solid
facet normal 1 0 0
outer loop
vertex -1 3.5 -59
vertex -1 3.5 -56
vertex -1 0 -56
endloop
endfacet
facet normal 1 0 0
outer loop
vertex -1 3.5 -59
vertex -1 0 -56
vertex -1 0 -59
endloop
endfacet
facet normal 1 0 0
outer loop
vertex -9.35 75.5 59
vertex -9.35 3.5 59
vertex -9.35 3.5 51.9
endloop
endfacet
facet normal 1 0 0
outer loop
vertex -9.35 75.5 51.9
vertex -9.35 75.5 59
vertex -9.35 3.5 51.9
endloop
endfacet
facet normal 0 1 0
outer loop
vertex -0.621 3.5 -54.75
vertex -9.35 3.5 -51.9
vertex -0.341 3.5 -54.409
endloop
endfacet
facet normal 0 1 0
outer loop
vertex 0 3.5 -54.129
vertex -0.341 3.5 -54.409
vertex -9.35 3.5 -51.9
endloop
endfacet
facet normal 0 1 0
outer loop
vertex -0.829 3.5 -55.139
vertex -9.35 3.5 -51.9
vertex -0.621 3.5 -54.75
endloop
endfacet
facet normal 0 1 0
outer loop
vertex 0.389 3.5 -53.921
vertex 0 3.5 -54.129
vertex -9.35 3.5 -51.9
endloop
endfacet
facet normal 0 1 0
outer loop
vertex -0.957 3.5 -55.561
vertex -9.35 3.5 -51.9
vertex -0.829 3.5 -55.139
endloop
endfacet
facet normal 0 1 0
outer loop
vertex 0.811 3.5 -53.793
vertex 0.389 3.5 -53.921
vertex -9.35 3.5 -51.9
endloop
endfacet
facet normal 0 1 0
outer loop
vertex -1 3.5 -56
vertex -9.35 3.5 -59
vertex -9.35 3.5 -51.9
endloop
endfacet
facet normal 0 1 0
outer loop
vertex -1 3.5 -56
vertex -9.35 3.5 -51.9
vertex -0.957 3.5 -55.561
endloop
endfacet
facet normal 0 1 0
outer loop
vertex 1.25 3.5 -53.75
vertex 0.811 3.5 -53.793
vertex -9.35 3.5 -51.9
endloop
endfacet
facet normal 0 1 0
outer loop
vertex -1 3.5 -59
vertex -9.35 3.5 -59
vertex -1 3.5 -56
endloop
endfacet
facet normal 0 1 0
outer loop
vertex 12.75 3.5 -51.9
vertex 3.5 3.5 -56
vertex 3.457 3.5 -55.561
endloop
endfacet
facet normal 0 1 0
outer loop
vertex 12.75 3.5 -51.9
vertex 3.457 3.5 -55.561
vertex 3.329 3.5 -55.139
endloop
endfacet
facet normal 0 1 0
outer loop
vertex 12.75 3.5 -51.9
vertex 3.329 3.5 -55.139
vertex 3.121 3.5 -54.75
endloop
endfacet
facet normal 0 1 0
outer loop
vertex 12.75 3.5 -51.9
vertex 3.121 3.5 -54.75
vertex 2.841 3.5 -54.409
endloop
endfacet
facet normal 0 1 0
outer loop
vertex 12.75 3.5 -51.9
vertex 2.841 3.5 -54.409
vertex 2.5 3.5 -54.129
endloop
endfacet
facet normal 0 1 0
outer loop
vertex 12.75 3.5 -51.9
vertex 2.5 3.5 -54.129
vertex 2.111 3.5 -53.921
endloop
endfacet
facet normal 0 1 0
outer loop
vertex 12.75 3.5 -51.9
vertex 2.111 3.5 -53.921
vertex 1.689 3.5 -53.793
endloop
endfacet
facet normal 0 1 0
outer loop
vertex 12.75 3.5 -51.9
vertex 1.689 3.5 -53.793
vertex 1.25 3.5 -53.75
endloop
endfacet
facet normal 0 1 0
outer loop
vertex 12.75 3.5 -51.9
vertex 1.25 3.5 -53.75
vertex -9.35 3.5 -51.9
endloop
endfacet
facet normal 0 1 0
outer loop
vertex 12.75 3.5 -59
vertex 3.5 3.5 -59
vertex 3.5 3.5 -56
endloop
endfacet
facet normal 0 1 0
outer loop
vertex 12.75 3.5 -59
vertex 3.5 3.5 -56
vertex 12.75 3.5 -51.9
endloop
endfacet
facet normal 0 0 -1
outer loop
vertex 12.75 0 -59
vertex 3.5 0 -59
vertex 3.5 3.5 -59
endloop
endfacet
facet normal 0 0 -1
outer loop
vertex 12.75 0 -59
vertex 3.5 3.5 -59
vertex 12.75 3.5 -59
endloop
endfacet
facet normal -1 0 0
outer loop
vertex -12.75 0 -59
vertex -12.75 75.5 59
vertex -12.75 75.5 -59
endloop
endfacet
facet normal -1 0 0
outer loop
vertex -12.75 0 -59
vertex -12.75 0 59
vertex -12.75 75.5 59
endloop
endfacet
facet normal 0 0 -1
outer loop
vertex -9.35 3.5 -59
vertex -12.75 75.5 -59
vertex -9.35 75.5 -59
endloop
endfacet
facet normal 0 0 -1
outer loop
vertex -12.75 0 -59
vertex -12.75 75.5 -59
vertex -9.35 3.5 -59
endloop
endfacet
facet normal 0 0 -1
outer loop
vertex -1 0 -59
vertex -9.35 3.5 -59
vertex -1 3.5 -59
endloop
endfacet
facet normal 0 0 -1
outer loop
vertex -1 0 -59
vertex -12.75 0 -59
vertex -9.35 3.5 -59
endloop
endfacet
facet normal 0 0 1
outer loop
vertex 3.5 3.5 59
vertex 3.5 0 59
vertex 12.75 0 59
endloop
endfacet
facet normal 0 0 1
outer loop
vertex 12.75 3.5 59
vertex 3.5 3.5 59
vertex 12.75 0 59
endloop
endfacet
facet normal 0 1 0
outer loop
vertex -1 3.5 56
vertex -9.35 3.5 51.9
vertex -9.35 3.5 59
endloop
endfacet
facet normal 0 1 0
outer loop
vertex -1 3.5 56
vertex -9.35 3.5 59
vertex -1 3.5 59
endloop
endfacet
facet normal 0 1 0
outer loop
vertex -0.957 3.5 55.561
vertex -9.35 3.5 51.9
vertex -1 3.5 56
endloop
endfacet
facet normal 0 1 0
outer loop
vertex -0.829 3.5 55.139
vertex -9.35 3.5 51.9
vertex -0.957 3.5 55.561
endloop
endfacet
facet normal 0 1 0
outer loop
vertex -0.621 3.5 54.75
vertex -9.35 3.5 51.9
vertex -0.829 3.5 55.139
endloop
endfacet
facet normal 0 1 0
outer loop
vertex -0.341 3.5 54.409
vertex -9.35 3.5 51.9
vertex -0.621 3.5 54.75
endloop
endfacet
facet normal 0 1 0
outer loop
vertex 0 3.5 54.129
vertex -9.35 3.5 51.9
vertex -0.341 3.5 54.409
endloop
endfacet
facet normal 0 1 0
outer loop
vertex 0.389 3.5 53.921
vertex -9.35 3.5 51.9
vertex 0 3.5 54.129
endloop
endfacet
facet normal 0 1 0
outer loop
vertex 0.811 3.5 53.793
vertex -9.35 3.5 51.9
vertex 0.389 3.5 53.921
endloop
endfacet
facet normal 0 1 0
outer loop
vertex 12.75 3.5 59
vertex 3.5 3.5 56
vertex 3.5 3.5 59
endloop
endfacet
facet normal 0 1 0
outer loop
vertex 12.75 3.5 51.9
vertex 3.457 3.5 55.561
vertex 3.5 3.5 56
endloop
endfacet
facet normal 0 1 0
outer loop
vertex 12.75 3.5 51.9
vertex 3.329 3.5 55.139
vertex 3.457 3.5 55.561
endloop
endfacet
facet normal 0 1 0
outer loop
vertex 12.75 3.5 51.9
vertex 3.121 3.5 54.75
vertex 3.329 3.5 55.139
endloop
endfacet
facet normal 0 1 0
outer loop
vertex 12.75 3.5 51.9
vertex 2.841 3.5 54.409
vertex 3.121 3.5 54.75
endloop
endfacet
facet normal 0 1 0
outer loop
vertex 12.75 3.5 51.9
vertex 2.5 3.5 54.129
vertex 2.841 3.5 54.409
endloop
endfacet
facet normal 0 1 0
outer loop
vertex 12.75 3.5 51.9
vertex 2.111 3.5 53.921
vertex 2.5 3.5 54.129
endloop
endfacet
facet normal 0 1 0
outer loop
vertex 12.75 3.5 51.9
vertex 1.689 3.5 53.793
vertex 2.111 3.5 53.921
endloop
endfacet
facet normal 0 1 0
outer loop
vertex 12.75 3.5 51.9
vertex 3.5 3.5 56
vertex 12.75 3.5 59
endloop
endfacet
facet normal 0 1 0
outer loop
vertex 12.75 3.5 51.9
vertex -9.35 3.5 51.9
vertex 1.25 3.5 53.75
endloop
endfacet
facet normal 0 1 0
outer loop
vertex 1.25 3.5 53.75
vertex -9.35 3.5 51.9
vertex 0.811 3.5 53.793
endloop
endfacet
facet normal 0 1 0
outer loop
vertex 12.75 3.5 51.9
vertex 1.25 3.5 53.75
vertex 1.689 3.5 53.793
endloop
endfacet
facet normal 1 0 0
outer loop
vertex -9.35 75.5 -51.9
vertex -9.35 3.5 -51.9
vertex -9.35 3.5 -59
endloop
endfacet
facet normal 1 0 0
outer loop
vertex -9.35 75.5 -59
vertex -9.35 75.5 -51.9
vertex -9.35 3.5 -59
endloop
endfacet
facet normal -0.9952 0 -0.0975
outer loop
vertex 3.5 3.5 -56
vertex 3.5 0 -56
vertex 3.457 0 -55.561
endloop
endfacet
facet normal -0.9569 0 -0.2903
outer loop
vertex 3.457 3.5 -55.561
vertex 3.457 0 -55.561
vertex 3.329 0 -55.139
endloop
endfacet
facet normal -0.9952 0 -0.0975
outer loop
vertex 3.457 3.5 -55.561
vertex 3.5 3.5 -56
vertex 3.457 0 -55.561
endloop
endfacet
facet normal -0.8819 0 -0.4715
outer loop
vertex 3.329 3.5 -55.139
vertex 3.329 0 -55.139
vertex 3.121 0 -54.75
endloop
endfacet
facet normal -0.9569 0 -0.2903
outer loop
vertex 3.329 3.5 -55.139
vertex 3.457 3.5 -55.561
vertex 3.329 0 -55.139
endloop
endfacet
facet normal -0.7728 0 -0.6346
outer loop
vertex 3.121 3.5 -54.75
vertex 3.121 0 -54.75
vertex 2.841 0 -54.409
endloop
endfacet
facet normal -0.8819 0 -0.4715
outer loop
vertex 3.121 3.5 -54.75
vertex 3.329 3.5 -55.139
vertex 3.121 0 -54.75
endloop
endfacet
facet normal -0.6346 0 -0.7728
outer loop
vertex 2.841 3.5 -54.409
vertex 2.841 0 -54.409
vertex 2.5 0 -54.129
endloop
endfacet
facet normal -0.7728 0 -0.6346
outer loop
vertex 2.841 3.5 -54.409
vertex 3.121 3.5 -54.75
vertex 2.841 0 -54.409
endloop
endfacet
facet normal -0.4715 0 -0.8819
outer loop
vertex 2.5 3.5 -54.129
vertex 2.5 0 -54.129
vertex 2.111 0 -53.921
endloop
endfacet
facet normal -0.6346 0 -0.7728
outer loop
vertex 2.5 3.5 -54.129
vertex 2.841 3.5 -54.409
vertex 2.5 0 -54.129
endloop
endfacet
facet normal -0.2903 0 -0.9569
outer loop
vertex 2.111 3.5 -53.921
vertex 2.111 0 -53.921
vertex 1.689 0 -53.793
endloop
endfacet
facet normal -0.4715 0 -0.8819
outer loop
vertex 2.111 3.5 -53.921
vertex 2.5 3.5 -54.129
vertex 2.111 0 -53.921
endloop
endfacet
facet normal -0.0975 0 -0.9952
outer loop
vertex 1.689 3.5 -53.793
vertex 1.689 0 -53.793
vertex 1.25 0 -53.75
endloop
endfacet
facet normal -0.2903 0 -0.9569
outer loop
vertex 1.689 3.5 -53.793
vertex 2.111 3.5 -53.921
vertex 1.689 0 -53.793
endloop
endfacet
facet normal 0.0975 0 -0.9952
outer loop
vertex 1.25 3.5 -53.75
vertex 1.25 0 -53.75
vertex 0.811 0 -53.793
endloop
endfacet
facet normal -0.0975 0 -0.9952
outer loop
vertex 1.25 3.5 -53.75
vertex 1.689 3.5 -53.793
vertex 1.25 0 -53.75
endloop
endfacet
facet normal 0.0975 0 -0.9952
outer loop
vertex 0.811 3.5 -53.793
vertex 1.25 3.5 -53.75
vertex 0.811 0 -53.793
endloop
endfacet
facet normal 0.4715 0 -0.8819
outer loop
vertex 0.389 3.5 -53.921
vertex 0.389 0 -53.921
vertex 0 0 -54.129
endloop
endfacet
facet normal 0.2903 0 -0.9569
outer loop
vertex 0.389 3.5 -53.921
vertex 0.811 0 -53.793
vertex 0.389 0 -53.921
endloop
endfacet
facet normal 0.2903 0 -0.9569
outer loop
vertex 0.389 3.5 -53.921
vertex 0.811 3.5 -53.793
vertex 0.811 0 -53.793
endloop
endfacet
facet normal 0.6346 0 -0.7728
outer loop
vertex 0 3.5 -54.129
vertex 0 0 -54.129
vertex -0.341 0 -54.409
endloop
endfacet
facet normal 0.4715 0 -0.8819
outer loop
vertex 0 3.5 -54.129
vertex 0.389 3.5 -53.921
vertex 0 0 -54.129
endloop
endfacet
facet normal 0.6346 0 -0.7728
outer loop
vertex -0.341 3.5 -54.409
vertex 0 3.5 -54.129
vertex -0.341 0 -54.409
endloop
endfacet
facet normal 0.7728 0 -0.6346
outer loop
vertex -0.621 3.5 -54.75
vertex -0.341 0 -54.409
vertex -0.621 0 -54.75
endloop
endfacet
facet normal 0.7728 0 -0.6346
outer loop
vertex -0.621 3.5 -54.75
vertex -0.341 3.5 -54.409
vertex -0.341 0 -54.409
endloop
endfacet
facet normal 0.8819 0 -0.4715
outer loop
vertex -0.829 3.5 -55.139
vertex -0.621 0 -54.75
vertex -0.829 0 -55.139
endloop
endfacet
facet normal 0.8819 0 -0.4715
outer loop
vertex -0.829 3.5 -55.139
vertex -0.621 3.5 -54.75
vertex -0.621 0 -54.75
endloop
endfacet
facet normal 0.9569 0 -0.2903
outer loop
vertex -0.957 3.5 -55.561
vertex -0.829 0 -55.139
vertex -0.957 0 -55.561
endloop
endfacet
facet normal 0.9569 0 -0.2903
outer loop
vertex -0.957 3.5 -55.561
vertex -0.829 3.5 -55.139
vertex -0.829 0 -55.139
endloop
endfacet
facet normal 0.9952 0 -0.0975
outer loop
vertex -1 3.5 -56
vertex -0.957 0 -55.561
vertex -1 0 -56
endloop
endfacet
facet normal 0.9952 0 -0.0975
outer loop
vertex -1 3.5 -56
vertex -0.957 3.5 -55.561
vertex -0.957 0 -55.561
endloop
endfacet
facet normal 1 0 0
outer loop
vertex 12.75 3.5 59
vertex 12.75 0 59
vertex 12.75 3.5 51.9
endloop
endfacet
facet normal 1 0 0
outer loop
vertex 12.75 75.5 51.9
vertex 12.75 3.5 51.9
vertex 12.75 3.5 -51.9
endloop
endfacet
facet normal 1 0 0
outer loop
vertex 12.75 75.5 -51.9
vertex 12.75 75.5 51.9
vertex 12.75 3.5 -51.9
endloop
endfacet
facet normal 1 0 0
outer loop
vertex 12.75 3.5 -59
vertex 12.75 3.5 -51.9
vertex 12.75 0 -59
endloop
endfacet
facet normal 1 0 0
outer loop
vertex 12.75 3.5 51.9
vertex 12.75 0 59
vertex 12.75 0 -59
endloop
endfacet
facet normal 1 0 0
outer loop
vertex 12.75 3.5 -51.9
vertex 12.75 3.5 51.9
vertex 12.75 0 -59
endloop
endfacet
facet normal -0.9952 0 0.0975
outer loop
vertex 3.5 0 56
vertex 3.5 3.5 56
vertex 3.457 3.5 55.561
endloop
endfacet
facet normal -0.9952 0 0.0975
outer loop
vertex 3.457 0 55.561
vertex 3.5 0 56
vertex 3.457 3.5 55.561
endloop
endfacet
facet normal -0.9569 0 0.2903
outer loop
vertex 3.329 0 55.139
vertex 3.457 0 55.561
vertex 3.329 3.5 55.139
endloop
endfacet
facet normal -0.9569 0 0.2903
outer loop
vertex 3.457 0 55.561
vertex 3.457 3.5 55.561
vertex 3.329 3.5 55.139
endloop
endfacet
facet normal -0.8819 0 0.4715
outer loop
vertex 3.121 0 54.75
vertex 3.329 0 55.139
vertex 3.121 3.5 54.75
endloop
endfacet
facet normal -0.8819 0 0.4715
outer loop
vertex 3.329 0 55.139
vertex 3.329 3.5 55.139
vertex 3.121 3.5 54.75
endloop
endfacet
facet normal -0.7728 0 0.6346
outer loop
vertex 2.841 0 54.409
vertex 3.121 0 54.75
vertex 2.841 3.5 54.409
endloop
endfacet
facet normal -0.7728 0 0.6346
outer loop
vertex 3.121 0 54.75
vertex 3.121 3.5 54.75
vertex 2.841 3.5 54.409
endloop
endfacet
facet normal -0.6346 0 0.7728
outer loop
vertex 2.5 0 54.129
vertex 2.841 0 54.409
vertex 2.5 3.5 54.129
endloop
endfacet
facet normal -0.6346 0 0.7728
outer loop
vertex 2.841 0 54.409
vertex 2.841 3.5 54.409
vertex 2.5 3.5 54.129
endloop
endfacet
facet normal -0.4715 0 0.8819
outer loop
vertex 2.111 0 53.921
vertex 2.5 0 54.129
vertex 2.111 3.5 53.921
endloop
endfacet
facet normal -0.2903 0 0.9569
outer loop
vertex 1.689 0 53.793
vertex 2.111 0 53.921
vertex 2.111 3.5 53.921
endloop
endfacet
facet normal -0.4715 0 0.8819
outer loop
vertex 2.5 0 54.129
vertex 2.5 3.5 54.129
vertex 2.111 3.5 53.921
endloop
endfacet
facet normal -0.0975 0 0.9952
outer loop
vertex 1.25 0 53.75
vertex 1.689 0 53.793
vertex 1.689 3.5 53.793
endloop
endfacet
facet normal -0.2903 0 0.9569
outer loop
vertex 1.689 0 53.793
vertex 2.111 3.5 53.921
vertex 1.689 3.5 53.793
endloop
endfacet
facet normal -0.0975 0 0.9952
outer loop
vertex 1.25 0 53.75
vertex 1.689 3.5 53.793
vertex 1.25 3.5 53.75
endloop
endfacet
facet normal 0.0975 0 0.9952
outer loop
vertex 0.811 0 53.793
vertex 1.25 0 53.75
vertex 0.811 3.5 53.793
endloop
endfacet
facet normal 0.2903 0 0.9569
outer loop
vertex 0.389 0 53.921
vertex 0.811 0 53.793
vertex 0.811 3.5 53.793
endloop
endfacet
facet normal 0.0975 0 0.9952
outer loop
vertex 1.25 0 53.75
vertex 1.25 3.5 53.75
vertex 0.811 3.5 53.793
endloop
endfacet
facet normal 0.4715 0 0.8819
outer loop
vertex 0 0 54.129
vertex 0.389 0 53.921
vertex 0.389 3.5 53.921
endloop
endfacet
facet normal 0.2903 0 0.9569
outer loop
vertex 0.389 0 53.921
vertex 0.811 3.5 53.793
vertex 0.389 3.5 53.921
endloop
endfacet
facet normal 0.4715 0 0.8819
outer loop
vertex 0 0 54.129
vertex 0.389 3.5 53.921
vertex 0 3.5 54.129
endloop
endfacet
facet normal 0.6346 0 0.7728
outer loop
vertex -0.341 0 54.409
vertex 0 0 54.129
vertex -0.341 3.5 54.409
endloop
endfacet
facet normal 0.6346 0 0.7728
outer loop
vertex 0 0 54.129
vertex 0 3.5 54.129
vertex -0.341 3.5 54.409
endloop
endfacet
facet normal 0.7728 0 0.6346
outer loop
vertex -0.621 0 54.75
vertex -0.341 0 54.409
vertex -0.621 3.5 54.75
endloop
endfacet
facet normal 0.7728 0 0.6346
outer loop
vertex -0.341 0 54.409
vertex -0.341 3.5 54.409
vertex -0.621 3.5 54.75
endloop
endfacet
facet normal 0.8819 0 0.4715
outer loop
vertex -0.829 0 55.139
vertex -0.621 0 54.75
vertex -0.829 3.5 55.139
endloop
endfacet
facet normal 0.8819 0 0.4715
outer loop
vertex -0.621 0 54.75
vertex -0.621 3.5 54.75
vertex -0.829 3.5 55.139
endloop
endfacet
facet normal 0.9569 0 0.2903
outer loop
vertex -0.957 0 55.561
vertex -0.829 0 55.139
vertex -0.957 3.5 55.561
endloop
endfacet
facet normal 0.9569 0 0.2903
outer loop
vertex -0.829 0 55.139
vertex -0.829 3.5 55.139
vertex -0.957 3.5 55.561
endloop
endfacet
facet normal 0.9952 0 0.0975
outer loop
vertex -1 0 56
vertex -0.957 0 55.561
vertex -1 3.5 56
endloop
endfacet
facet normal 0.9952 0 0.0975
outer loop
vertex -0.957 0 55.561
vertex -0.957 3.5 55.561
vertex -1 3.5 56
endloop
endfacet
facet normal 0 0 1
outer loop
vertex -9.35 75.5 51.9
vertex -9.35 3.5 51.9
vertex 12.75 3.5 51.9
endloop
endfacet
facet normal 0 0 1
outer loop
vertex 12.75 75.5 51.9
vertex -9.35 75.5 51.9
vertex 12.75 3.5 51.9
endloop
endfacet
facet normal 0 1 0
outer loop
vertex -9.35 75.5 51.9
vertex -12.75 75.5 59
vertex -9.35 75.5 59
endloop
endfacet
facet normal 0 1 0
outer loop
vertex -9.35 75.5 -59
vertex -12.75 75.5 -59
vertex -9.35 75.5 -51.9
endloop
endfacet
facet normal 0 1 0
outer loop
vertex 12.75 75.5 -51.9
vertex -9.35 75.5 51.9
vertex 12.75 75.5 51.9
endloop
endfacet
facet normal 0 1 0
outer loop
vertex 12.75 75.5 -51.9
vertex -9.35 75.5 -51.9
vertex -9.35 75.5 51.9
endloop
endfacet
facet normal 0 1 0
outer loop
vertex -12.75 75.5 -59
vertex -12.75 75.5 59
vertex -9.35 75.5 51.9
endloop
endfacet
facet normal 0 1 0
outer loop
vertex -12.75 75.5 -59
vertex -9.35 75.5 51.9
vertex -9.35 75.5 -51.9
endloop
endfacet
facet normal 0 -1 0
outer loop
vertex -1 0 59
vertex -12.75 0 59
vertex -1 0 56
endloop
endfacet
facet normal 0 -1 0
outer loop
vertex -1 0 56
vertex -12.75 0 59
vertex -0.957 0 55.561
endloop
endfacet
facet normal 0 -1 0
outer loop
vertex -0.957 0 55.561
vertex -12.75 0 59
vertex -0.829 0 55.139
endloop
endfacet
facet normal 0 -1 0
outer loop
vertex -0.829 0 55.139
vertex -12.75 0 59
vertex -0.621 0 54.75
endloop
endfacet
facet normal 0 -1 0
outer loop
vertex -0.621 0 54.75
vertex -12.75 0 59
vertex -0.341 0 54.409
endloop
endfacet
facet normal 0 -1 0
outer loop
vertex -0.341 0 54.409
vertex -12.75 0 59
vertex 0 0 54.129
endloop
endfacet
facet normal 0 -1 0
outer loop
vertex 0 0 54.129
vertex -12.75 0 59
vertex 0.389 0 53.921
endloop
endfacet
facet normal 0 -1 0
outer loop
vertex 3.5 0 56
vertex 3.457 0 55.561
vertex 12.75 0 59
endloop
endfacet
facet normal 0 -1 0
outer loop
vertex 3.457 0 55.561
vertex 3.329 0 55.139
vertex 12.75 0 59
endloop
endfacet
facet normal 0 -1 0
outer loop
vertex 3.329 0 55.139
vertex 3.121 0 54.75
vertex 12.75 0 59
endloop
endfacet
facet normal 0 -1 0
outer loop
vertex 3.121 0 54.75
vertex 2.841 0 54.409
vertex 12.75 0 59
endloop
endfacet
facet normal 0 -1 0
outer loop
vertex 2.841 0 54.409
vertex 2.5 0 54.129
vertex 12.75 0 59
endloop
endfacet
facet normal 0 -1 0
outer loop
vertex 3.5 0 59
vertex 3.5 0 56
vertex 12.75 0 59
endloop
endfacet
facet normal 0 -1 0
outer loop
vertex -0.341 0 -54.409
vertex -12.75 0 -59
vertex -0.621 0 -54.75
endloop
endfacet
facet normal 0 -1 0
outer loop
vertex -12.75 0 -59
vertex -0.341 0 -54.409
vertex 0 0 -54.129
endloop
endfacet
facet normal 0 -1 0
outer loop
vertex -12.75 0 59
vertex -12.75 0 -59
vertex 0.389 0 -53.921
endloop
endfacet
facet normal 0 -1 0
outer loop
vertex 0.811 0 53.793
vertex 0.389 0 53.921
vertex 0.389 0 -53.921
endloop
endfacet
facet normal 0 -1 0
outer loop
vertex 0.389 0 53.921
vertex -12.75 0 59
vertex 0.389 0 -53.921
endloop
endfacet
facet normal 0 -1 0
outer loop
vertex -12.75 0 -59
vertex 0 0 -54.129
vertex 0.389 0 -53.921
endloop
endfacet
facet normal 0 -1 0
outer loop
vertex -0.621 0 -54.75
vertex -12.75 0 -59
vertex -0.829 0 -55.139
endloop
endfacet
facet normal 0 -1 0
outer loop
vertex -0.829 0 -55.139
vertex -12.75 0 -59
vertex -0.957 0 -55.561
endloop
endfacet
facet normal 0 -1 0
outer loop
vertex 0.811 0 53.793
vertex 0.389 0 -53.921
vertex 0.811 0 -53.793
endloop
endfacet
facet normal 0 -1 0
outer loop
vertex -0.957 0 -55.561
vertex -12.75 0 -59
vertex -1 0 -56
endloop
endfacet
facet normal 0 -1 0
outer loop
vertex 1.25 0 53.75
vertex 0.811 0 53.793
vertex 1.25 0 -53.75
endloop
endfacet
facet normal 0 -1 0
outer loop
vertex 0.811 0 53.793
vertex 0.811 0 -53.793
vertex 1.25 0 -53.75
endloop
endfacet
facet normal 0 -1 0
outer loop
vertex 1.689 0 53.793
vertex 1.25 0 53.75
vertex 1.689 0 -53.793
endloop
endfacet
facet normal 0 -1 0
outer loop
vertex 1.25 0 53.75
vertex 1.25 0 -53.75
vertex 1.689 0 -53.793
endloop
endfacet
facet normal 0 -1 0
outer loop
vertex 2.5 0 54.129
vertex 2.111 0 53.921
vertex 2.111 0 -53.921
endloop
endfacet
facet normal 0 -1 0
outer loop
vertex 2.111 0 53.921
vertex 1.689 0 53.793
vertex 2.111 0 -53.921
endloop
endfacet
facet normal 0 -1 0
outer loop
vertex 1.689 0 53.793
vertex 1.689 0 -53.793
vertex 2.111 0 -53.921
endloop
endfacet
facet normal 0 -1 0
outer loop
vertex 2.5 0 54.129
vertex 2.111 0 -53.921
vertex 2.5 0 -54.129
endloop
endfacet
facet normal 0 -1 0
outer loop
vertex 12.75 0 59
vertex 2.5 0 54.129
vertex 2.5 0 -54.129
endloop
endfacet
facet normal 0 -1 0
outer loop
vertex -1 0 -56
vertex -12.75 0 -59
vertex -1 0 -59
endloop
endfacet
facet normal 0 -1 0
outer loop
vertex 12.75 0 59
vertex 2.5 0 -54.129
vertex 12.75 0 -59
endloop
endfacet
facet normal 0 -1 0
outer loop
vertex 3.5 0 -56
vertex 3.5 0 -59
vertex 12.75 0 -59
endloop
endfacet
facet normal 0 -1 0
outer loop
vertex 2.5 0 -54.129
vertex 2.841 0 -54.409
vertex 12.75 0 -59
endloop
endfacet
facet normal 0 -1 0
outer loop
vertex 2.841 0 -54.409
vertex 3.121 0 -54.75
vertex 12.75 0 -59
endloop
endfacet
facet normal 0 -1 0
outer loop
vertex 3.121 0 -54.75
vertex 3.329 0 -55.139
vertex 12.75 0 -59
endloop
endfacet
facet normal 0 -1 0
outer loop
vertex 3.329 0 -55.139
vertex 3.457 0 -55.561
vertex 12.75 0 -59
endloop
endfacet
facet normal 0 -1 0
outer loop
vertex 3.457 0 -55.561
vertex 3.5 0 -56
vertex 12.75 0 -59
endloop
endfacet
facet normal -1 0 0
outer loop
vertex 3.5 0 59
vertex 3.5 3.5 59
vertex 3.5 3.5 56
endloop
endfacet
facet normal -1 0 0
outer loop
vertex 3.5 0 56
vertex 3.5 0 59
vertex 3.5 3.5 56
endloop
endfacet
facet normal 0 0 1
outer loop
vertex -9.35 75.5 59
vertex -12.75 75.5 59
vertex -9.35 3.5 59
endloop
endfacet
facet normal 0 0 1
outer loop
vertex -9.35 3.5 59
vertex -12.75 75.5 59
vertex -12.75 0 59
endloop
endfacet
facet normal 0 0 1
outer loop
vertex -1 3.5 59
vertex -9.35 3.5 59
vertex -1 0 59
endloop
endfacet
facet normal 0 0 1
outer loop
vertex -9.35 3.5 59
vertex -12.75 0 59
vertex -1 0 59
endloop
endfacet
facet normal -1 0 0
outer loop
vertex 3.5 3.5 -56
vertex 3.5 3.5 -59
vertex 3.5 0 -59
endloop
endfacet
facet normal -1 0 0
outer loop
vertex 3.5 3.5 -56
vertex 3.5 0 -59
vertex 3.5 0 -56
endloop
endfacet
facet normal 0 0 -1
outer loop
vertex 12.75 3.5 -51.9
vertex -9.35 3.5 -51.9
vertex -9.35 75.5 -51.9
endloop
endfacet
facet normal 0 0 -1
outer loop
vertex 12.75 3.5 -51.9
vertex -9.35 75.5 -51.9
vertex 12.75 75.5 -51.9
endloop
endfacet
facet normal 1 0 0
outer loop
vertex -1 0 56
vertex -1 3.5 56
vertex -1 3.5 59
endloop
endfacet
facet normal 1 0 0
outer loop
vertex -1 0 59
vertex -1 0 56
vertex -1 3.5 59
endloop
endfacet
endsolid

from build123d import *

# Parameters (mm, degrees)
SKETCH2_W           = 25.5
SKETCH2_H           = 118
BOSS_EXTRUDE3_DEPTH = 3.5
CUT_EXTRUDE1_DEPTH  = 4.5
SKETCH4_W           = 3.4
SKETCH4_H           = 118
BOSS_EXTRUDE4_DEPTH = 72
SKETCH5_W           = 22.1
SKETCH5_H           = 103.8
BOSS_EXTRUDE5_DEPTH = 72


with BuildPart() as part:
    # Sketch2 → Boss-Extrude3 (new body)
    with BuildSketch(Plane(origin=(0, 0, 0), x_dir=(1, 0, 0), z_dir=(0, 1, 0))):
        Rectangle(SKETCH2_W, SKETCH2_H)
    extrude(amount=BOSS_EXTRUDE3_DEPTH)

    # Sketch3 → Cut-Extrude1 (cut, through all)
    with BuildSketch(Plane(origin=(0, 3.5, 0), x_dir=(1, 0, 0), z_dir=(0, 1, 0))):
        with BuildLine():
            Line((-1, 56), (-1, 59))
            Line((-1, 59), (3.5, 59))
            Line((3.5, 59), (3.5, 56))
            ThreePointArc((3.5, 56), (1.25, 53.75), (-1, 56))
        make_face()
        with BuildLine():
            Line((-1, -56), (-1, -59))
            Line((-1, -59), (3.5, -59))
            Line((3.5, -59), (3.5, -56))
            ThreePointArc((3.5, -56), (1.25, -53.75), (-1, -56))
        make_face()
    extrude(amount=-CUT_EXTRUDE1_DEPTH, mode=Mode.SUBTRACT)

    # Sketch4 → Boss-Extrude4 (add)
    with BuildSketch(Plane(origin=(0, 3.5, 0), x_dir=(1, 0, 0), z_dir=(0, 1, 0))):
        with Locations((-11.05, 0)):
            Rectangle(SKETCH4_W, SKETCH4_H)
    extrude(amount=BOSS_EXTRUDE4_DEPTH)

    # Sketch5 → Boss-Extrude5 (add)
    with BuildSketch(Plane(origin=(0, 3.5, 0), x_dir=(1, 0, 0), z_dir=(0, 1, 0))):
        with Locations((1.7, 0)):
            Rectangle(SKETCH5_W, SKETCH5_H)
    extrude(amount=BOSS_EXTRUDE5_DEPTH)


solid = part.part
